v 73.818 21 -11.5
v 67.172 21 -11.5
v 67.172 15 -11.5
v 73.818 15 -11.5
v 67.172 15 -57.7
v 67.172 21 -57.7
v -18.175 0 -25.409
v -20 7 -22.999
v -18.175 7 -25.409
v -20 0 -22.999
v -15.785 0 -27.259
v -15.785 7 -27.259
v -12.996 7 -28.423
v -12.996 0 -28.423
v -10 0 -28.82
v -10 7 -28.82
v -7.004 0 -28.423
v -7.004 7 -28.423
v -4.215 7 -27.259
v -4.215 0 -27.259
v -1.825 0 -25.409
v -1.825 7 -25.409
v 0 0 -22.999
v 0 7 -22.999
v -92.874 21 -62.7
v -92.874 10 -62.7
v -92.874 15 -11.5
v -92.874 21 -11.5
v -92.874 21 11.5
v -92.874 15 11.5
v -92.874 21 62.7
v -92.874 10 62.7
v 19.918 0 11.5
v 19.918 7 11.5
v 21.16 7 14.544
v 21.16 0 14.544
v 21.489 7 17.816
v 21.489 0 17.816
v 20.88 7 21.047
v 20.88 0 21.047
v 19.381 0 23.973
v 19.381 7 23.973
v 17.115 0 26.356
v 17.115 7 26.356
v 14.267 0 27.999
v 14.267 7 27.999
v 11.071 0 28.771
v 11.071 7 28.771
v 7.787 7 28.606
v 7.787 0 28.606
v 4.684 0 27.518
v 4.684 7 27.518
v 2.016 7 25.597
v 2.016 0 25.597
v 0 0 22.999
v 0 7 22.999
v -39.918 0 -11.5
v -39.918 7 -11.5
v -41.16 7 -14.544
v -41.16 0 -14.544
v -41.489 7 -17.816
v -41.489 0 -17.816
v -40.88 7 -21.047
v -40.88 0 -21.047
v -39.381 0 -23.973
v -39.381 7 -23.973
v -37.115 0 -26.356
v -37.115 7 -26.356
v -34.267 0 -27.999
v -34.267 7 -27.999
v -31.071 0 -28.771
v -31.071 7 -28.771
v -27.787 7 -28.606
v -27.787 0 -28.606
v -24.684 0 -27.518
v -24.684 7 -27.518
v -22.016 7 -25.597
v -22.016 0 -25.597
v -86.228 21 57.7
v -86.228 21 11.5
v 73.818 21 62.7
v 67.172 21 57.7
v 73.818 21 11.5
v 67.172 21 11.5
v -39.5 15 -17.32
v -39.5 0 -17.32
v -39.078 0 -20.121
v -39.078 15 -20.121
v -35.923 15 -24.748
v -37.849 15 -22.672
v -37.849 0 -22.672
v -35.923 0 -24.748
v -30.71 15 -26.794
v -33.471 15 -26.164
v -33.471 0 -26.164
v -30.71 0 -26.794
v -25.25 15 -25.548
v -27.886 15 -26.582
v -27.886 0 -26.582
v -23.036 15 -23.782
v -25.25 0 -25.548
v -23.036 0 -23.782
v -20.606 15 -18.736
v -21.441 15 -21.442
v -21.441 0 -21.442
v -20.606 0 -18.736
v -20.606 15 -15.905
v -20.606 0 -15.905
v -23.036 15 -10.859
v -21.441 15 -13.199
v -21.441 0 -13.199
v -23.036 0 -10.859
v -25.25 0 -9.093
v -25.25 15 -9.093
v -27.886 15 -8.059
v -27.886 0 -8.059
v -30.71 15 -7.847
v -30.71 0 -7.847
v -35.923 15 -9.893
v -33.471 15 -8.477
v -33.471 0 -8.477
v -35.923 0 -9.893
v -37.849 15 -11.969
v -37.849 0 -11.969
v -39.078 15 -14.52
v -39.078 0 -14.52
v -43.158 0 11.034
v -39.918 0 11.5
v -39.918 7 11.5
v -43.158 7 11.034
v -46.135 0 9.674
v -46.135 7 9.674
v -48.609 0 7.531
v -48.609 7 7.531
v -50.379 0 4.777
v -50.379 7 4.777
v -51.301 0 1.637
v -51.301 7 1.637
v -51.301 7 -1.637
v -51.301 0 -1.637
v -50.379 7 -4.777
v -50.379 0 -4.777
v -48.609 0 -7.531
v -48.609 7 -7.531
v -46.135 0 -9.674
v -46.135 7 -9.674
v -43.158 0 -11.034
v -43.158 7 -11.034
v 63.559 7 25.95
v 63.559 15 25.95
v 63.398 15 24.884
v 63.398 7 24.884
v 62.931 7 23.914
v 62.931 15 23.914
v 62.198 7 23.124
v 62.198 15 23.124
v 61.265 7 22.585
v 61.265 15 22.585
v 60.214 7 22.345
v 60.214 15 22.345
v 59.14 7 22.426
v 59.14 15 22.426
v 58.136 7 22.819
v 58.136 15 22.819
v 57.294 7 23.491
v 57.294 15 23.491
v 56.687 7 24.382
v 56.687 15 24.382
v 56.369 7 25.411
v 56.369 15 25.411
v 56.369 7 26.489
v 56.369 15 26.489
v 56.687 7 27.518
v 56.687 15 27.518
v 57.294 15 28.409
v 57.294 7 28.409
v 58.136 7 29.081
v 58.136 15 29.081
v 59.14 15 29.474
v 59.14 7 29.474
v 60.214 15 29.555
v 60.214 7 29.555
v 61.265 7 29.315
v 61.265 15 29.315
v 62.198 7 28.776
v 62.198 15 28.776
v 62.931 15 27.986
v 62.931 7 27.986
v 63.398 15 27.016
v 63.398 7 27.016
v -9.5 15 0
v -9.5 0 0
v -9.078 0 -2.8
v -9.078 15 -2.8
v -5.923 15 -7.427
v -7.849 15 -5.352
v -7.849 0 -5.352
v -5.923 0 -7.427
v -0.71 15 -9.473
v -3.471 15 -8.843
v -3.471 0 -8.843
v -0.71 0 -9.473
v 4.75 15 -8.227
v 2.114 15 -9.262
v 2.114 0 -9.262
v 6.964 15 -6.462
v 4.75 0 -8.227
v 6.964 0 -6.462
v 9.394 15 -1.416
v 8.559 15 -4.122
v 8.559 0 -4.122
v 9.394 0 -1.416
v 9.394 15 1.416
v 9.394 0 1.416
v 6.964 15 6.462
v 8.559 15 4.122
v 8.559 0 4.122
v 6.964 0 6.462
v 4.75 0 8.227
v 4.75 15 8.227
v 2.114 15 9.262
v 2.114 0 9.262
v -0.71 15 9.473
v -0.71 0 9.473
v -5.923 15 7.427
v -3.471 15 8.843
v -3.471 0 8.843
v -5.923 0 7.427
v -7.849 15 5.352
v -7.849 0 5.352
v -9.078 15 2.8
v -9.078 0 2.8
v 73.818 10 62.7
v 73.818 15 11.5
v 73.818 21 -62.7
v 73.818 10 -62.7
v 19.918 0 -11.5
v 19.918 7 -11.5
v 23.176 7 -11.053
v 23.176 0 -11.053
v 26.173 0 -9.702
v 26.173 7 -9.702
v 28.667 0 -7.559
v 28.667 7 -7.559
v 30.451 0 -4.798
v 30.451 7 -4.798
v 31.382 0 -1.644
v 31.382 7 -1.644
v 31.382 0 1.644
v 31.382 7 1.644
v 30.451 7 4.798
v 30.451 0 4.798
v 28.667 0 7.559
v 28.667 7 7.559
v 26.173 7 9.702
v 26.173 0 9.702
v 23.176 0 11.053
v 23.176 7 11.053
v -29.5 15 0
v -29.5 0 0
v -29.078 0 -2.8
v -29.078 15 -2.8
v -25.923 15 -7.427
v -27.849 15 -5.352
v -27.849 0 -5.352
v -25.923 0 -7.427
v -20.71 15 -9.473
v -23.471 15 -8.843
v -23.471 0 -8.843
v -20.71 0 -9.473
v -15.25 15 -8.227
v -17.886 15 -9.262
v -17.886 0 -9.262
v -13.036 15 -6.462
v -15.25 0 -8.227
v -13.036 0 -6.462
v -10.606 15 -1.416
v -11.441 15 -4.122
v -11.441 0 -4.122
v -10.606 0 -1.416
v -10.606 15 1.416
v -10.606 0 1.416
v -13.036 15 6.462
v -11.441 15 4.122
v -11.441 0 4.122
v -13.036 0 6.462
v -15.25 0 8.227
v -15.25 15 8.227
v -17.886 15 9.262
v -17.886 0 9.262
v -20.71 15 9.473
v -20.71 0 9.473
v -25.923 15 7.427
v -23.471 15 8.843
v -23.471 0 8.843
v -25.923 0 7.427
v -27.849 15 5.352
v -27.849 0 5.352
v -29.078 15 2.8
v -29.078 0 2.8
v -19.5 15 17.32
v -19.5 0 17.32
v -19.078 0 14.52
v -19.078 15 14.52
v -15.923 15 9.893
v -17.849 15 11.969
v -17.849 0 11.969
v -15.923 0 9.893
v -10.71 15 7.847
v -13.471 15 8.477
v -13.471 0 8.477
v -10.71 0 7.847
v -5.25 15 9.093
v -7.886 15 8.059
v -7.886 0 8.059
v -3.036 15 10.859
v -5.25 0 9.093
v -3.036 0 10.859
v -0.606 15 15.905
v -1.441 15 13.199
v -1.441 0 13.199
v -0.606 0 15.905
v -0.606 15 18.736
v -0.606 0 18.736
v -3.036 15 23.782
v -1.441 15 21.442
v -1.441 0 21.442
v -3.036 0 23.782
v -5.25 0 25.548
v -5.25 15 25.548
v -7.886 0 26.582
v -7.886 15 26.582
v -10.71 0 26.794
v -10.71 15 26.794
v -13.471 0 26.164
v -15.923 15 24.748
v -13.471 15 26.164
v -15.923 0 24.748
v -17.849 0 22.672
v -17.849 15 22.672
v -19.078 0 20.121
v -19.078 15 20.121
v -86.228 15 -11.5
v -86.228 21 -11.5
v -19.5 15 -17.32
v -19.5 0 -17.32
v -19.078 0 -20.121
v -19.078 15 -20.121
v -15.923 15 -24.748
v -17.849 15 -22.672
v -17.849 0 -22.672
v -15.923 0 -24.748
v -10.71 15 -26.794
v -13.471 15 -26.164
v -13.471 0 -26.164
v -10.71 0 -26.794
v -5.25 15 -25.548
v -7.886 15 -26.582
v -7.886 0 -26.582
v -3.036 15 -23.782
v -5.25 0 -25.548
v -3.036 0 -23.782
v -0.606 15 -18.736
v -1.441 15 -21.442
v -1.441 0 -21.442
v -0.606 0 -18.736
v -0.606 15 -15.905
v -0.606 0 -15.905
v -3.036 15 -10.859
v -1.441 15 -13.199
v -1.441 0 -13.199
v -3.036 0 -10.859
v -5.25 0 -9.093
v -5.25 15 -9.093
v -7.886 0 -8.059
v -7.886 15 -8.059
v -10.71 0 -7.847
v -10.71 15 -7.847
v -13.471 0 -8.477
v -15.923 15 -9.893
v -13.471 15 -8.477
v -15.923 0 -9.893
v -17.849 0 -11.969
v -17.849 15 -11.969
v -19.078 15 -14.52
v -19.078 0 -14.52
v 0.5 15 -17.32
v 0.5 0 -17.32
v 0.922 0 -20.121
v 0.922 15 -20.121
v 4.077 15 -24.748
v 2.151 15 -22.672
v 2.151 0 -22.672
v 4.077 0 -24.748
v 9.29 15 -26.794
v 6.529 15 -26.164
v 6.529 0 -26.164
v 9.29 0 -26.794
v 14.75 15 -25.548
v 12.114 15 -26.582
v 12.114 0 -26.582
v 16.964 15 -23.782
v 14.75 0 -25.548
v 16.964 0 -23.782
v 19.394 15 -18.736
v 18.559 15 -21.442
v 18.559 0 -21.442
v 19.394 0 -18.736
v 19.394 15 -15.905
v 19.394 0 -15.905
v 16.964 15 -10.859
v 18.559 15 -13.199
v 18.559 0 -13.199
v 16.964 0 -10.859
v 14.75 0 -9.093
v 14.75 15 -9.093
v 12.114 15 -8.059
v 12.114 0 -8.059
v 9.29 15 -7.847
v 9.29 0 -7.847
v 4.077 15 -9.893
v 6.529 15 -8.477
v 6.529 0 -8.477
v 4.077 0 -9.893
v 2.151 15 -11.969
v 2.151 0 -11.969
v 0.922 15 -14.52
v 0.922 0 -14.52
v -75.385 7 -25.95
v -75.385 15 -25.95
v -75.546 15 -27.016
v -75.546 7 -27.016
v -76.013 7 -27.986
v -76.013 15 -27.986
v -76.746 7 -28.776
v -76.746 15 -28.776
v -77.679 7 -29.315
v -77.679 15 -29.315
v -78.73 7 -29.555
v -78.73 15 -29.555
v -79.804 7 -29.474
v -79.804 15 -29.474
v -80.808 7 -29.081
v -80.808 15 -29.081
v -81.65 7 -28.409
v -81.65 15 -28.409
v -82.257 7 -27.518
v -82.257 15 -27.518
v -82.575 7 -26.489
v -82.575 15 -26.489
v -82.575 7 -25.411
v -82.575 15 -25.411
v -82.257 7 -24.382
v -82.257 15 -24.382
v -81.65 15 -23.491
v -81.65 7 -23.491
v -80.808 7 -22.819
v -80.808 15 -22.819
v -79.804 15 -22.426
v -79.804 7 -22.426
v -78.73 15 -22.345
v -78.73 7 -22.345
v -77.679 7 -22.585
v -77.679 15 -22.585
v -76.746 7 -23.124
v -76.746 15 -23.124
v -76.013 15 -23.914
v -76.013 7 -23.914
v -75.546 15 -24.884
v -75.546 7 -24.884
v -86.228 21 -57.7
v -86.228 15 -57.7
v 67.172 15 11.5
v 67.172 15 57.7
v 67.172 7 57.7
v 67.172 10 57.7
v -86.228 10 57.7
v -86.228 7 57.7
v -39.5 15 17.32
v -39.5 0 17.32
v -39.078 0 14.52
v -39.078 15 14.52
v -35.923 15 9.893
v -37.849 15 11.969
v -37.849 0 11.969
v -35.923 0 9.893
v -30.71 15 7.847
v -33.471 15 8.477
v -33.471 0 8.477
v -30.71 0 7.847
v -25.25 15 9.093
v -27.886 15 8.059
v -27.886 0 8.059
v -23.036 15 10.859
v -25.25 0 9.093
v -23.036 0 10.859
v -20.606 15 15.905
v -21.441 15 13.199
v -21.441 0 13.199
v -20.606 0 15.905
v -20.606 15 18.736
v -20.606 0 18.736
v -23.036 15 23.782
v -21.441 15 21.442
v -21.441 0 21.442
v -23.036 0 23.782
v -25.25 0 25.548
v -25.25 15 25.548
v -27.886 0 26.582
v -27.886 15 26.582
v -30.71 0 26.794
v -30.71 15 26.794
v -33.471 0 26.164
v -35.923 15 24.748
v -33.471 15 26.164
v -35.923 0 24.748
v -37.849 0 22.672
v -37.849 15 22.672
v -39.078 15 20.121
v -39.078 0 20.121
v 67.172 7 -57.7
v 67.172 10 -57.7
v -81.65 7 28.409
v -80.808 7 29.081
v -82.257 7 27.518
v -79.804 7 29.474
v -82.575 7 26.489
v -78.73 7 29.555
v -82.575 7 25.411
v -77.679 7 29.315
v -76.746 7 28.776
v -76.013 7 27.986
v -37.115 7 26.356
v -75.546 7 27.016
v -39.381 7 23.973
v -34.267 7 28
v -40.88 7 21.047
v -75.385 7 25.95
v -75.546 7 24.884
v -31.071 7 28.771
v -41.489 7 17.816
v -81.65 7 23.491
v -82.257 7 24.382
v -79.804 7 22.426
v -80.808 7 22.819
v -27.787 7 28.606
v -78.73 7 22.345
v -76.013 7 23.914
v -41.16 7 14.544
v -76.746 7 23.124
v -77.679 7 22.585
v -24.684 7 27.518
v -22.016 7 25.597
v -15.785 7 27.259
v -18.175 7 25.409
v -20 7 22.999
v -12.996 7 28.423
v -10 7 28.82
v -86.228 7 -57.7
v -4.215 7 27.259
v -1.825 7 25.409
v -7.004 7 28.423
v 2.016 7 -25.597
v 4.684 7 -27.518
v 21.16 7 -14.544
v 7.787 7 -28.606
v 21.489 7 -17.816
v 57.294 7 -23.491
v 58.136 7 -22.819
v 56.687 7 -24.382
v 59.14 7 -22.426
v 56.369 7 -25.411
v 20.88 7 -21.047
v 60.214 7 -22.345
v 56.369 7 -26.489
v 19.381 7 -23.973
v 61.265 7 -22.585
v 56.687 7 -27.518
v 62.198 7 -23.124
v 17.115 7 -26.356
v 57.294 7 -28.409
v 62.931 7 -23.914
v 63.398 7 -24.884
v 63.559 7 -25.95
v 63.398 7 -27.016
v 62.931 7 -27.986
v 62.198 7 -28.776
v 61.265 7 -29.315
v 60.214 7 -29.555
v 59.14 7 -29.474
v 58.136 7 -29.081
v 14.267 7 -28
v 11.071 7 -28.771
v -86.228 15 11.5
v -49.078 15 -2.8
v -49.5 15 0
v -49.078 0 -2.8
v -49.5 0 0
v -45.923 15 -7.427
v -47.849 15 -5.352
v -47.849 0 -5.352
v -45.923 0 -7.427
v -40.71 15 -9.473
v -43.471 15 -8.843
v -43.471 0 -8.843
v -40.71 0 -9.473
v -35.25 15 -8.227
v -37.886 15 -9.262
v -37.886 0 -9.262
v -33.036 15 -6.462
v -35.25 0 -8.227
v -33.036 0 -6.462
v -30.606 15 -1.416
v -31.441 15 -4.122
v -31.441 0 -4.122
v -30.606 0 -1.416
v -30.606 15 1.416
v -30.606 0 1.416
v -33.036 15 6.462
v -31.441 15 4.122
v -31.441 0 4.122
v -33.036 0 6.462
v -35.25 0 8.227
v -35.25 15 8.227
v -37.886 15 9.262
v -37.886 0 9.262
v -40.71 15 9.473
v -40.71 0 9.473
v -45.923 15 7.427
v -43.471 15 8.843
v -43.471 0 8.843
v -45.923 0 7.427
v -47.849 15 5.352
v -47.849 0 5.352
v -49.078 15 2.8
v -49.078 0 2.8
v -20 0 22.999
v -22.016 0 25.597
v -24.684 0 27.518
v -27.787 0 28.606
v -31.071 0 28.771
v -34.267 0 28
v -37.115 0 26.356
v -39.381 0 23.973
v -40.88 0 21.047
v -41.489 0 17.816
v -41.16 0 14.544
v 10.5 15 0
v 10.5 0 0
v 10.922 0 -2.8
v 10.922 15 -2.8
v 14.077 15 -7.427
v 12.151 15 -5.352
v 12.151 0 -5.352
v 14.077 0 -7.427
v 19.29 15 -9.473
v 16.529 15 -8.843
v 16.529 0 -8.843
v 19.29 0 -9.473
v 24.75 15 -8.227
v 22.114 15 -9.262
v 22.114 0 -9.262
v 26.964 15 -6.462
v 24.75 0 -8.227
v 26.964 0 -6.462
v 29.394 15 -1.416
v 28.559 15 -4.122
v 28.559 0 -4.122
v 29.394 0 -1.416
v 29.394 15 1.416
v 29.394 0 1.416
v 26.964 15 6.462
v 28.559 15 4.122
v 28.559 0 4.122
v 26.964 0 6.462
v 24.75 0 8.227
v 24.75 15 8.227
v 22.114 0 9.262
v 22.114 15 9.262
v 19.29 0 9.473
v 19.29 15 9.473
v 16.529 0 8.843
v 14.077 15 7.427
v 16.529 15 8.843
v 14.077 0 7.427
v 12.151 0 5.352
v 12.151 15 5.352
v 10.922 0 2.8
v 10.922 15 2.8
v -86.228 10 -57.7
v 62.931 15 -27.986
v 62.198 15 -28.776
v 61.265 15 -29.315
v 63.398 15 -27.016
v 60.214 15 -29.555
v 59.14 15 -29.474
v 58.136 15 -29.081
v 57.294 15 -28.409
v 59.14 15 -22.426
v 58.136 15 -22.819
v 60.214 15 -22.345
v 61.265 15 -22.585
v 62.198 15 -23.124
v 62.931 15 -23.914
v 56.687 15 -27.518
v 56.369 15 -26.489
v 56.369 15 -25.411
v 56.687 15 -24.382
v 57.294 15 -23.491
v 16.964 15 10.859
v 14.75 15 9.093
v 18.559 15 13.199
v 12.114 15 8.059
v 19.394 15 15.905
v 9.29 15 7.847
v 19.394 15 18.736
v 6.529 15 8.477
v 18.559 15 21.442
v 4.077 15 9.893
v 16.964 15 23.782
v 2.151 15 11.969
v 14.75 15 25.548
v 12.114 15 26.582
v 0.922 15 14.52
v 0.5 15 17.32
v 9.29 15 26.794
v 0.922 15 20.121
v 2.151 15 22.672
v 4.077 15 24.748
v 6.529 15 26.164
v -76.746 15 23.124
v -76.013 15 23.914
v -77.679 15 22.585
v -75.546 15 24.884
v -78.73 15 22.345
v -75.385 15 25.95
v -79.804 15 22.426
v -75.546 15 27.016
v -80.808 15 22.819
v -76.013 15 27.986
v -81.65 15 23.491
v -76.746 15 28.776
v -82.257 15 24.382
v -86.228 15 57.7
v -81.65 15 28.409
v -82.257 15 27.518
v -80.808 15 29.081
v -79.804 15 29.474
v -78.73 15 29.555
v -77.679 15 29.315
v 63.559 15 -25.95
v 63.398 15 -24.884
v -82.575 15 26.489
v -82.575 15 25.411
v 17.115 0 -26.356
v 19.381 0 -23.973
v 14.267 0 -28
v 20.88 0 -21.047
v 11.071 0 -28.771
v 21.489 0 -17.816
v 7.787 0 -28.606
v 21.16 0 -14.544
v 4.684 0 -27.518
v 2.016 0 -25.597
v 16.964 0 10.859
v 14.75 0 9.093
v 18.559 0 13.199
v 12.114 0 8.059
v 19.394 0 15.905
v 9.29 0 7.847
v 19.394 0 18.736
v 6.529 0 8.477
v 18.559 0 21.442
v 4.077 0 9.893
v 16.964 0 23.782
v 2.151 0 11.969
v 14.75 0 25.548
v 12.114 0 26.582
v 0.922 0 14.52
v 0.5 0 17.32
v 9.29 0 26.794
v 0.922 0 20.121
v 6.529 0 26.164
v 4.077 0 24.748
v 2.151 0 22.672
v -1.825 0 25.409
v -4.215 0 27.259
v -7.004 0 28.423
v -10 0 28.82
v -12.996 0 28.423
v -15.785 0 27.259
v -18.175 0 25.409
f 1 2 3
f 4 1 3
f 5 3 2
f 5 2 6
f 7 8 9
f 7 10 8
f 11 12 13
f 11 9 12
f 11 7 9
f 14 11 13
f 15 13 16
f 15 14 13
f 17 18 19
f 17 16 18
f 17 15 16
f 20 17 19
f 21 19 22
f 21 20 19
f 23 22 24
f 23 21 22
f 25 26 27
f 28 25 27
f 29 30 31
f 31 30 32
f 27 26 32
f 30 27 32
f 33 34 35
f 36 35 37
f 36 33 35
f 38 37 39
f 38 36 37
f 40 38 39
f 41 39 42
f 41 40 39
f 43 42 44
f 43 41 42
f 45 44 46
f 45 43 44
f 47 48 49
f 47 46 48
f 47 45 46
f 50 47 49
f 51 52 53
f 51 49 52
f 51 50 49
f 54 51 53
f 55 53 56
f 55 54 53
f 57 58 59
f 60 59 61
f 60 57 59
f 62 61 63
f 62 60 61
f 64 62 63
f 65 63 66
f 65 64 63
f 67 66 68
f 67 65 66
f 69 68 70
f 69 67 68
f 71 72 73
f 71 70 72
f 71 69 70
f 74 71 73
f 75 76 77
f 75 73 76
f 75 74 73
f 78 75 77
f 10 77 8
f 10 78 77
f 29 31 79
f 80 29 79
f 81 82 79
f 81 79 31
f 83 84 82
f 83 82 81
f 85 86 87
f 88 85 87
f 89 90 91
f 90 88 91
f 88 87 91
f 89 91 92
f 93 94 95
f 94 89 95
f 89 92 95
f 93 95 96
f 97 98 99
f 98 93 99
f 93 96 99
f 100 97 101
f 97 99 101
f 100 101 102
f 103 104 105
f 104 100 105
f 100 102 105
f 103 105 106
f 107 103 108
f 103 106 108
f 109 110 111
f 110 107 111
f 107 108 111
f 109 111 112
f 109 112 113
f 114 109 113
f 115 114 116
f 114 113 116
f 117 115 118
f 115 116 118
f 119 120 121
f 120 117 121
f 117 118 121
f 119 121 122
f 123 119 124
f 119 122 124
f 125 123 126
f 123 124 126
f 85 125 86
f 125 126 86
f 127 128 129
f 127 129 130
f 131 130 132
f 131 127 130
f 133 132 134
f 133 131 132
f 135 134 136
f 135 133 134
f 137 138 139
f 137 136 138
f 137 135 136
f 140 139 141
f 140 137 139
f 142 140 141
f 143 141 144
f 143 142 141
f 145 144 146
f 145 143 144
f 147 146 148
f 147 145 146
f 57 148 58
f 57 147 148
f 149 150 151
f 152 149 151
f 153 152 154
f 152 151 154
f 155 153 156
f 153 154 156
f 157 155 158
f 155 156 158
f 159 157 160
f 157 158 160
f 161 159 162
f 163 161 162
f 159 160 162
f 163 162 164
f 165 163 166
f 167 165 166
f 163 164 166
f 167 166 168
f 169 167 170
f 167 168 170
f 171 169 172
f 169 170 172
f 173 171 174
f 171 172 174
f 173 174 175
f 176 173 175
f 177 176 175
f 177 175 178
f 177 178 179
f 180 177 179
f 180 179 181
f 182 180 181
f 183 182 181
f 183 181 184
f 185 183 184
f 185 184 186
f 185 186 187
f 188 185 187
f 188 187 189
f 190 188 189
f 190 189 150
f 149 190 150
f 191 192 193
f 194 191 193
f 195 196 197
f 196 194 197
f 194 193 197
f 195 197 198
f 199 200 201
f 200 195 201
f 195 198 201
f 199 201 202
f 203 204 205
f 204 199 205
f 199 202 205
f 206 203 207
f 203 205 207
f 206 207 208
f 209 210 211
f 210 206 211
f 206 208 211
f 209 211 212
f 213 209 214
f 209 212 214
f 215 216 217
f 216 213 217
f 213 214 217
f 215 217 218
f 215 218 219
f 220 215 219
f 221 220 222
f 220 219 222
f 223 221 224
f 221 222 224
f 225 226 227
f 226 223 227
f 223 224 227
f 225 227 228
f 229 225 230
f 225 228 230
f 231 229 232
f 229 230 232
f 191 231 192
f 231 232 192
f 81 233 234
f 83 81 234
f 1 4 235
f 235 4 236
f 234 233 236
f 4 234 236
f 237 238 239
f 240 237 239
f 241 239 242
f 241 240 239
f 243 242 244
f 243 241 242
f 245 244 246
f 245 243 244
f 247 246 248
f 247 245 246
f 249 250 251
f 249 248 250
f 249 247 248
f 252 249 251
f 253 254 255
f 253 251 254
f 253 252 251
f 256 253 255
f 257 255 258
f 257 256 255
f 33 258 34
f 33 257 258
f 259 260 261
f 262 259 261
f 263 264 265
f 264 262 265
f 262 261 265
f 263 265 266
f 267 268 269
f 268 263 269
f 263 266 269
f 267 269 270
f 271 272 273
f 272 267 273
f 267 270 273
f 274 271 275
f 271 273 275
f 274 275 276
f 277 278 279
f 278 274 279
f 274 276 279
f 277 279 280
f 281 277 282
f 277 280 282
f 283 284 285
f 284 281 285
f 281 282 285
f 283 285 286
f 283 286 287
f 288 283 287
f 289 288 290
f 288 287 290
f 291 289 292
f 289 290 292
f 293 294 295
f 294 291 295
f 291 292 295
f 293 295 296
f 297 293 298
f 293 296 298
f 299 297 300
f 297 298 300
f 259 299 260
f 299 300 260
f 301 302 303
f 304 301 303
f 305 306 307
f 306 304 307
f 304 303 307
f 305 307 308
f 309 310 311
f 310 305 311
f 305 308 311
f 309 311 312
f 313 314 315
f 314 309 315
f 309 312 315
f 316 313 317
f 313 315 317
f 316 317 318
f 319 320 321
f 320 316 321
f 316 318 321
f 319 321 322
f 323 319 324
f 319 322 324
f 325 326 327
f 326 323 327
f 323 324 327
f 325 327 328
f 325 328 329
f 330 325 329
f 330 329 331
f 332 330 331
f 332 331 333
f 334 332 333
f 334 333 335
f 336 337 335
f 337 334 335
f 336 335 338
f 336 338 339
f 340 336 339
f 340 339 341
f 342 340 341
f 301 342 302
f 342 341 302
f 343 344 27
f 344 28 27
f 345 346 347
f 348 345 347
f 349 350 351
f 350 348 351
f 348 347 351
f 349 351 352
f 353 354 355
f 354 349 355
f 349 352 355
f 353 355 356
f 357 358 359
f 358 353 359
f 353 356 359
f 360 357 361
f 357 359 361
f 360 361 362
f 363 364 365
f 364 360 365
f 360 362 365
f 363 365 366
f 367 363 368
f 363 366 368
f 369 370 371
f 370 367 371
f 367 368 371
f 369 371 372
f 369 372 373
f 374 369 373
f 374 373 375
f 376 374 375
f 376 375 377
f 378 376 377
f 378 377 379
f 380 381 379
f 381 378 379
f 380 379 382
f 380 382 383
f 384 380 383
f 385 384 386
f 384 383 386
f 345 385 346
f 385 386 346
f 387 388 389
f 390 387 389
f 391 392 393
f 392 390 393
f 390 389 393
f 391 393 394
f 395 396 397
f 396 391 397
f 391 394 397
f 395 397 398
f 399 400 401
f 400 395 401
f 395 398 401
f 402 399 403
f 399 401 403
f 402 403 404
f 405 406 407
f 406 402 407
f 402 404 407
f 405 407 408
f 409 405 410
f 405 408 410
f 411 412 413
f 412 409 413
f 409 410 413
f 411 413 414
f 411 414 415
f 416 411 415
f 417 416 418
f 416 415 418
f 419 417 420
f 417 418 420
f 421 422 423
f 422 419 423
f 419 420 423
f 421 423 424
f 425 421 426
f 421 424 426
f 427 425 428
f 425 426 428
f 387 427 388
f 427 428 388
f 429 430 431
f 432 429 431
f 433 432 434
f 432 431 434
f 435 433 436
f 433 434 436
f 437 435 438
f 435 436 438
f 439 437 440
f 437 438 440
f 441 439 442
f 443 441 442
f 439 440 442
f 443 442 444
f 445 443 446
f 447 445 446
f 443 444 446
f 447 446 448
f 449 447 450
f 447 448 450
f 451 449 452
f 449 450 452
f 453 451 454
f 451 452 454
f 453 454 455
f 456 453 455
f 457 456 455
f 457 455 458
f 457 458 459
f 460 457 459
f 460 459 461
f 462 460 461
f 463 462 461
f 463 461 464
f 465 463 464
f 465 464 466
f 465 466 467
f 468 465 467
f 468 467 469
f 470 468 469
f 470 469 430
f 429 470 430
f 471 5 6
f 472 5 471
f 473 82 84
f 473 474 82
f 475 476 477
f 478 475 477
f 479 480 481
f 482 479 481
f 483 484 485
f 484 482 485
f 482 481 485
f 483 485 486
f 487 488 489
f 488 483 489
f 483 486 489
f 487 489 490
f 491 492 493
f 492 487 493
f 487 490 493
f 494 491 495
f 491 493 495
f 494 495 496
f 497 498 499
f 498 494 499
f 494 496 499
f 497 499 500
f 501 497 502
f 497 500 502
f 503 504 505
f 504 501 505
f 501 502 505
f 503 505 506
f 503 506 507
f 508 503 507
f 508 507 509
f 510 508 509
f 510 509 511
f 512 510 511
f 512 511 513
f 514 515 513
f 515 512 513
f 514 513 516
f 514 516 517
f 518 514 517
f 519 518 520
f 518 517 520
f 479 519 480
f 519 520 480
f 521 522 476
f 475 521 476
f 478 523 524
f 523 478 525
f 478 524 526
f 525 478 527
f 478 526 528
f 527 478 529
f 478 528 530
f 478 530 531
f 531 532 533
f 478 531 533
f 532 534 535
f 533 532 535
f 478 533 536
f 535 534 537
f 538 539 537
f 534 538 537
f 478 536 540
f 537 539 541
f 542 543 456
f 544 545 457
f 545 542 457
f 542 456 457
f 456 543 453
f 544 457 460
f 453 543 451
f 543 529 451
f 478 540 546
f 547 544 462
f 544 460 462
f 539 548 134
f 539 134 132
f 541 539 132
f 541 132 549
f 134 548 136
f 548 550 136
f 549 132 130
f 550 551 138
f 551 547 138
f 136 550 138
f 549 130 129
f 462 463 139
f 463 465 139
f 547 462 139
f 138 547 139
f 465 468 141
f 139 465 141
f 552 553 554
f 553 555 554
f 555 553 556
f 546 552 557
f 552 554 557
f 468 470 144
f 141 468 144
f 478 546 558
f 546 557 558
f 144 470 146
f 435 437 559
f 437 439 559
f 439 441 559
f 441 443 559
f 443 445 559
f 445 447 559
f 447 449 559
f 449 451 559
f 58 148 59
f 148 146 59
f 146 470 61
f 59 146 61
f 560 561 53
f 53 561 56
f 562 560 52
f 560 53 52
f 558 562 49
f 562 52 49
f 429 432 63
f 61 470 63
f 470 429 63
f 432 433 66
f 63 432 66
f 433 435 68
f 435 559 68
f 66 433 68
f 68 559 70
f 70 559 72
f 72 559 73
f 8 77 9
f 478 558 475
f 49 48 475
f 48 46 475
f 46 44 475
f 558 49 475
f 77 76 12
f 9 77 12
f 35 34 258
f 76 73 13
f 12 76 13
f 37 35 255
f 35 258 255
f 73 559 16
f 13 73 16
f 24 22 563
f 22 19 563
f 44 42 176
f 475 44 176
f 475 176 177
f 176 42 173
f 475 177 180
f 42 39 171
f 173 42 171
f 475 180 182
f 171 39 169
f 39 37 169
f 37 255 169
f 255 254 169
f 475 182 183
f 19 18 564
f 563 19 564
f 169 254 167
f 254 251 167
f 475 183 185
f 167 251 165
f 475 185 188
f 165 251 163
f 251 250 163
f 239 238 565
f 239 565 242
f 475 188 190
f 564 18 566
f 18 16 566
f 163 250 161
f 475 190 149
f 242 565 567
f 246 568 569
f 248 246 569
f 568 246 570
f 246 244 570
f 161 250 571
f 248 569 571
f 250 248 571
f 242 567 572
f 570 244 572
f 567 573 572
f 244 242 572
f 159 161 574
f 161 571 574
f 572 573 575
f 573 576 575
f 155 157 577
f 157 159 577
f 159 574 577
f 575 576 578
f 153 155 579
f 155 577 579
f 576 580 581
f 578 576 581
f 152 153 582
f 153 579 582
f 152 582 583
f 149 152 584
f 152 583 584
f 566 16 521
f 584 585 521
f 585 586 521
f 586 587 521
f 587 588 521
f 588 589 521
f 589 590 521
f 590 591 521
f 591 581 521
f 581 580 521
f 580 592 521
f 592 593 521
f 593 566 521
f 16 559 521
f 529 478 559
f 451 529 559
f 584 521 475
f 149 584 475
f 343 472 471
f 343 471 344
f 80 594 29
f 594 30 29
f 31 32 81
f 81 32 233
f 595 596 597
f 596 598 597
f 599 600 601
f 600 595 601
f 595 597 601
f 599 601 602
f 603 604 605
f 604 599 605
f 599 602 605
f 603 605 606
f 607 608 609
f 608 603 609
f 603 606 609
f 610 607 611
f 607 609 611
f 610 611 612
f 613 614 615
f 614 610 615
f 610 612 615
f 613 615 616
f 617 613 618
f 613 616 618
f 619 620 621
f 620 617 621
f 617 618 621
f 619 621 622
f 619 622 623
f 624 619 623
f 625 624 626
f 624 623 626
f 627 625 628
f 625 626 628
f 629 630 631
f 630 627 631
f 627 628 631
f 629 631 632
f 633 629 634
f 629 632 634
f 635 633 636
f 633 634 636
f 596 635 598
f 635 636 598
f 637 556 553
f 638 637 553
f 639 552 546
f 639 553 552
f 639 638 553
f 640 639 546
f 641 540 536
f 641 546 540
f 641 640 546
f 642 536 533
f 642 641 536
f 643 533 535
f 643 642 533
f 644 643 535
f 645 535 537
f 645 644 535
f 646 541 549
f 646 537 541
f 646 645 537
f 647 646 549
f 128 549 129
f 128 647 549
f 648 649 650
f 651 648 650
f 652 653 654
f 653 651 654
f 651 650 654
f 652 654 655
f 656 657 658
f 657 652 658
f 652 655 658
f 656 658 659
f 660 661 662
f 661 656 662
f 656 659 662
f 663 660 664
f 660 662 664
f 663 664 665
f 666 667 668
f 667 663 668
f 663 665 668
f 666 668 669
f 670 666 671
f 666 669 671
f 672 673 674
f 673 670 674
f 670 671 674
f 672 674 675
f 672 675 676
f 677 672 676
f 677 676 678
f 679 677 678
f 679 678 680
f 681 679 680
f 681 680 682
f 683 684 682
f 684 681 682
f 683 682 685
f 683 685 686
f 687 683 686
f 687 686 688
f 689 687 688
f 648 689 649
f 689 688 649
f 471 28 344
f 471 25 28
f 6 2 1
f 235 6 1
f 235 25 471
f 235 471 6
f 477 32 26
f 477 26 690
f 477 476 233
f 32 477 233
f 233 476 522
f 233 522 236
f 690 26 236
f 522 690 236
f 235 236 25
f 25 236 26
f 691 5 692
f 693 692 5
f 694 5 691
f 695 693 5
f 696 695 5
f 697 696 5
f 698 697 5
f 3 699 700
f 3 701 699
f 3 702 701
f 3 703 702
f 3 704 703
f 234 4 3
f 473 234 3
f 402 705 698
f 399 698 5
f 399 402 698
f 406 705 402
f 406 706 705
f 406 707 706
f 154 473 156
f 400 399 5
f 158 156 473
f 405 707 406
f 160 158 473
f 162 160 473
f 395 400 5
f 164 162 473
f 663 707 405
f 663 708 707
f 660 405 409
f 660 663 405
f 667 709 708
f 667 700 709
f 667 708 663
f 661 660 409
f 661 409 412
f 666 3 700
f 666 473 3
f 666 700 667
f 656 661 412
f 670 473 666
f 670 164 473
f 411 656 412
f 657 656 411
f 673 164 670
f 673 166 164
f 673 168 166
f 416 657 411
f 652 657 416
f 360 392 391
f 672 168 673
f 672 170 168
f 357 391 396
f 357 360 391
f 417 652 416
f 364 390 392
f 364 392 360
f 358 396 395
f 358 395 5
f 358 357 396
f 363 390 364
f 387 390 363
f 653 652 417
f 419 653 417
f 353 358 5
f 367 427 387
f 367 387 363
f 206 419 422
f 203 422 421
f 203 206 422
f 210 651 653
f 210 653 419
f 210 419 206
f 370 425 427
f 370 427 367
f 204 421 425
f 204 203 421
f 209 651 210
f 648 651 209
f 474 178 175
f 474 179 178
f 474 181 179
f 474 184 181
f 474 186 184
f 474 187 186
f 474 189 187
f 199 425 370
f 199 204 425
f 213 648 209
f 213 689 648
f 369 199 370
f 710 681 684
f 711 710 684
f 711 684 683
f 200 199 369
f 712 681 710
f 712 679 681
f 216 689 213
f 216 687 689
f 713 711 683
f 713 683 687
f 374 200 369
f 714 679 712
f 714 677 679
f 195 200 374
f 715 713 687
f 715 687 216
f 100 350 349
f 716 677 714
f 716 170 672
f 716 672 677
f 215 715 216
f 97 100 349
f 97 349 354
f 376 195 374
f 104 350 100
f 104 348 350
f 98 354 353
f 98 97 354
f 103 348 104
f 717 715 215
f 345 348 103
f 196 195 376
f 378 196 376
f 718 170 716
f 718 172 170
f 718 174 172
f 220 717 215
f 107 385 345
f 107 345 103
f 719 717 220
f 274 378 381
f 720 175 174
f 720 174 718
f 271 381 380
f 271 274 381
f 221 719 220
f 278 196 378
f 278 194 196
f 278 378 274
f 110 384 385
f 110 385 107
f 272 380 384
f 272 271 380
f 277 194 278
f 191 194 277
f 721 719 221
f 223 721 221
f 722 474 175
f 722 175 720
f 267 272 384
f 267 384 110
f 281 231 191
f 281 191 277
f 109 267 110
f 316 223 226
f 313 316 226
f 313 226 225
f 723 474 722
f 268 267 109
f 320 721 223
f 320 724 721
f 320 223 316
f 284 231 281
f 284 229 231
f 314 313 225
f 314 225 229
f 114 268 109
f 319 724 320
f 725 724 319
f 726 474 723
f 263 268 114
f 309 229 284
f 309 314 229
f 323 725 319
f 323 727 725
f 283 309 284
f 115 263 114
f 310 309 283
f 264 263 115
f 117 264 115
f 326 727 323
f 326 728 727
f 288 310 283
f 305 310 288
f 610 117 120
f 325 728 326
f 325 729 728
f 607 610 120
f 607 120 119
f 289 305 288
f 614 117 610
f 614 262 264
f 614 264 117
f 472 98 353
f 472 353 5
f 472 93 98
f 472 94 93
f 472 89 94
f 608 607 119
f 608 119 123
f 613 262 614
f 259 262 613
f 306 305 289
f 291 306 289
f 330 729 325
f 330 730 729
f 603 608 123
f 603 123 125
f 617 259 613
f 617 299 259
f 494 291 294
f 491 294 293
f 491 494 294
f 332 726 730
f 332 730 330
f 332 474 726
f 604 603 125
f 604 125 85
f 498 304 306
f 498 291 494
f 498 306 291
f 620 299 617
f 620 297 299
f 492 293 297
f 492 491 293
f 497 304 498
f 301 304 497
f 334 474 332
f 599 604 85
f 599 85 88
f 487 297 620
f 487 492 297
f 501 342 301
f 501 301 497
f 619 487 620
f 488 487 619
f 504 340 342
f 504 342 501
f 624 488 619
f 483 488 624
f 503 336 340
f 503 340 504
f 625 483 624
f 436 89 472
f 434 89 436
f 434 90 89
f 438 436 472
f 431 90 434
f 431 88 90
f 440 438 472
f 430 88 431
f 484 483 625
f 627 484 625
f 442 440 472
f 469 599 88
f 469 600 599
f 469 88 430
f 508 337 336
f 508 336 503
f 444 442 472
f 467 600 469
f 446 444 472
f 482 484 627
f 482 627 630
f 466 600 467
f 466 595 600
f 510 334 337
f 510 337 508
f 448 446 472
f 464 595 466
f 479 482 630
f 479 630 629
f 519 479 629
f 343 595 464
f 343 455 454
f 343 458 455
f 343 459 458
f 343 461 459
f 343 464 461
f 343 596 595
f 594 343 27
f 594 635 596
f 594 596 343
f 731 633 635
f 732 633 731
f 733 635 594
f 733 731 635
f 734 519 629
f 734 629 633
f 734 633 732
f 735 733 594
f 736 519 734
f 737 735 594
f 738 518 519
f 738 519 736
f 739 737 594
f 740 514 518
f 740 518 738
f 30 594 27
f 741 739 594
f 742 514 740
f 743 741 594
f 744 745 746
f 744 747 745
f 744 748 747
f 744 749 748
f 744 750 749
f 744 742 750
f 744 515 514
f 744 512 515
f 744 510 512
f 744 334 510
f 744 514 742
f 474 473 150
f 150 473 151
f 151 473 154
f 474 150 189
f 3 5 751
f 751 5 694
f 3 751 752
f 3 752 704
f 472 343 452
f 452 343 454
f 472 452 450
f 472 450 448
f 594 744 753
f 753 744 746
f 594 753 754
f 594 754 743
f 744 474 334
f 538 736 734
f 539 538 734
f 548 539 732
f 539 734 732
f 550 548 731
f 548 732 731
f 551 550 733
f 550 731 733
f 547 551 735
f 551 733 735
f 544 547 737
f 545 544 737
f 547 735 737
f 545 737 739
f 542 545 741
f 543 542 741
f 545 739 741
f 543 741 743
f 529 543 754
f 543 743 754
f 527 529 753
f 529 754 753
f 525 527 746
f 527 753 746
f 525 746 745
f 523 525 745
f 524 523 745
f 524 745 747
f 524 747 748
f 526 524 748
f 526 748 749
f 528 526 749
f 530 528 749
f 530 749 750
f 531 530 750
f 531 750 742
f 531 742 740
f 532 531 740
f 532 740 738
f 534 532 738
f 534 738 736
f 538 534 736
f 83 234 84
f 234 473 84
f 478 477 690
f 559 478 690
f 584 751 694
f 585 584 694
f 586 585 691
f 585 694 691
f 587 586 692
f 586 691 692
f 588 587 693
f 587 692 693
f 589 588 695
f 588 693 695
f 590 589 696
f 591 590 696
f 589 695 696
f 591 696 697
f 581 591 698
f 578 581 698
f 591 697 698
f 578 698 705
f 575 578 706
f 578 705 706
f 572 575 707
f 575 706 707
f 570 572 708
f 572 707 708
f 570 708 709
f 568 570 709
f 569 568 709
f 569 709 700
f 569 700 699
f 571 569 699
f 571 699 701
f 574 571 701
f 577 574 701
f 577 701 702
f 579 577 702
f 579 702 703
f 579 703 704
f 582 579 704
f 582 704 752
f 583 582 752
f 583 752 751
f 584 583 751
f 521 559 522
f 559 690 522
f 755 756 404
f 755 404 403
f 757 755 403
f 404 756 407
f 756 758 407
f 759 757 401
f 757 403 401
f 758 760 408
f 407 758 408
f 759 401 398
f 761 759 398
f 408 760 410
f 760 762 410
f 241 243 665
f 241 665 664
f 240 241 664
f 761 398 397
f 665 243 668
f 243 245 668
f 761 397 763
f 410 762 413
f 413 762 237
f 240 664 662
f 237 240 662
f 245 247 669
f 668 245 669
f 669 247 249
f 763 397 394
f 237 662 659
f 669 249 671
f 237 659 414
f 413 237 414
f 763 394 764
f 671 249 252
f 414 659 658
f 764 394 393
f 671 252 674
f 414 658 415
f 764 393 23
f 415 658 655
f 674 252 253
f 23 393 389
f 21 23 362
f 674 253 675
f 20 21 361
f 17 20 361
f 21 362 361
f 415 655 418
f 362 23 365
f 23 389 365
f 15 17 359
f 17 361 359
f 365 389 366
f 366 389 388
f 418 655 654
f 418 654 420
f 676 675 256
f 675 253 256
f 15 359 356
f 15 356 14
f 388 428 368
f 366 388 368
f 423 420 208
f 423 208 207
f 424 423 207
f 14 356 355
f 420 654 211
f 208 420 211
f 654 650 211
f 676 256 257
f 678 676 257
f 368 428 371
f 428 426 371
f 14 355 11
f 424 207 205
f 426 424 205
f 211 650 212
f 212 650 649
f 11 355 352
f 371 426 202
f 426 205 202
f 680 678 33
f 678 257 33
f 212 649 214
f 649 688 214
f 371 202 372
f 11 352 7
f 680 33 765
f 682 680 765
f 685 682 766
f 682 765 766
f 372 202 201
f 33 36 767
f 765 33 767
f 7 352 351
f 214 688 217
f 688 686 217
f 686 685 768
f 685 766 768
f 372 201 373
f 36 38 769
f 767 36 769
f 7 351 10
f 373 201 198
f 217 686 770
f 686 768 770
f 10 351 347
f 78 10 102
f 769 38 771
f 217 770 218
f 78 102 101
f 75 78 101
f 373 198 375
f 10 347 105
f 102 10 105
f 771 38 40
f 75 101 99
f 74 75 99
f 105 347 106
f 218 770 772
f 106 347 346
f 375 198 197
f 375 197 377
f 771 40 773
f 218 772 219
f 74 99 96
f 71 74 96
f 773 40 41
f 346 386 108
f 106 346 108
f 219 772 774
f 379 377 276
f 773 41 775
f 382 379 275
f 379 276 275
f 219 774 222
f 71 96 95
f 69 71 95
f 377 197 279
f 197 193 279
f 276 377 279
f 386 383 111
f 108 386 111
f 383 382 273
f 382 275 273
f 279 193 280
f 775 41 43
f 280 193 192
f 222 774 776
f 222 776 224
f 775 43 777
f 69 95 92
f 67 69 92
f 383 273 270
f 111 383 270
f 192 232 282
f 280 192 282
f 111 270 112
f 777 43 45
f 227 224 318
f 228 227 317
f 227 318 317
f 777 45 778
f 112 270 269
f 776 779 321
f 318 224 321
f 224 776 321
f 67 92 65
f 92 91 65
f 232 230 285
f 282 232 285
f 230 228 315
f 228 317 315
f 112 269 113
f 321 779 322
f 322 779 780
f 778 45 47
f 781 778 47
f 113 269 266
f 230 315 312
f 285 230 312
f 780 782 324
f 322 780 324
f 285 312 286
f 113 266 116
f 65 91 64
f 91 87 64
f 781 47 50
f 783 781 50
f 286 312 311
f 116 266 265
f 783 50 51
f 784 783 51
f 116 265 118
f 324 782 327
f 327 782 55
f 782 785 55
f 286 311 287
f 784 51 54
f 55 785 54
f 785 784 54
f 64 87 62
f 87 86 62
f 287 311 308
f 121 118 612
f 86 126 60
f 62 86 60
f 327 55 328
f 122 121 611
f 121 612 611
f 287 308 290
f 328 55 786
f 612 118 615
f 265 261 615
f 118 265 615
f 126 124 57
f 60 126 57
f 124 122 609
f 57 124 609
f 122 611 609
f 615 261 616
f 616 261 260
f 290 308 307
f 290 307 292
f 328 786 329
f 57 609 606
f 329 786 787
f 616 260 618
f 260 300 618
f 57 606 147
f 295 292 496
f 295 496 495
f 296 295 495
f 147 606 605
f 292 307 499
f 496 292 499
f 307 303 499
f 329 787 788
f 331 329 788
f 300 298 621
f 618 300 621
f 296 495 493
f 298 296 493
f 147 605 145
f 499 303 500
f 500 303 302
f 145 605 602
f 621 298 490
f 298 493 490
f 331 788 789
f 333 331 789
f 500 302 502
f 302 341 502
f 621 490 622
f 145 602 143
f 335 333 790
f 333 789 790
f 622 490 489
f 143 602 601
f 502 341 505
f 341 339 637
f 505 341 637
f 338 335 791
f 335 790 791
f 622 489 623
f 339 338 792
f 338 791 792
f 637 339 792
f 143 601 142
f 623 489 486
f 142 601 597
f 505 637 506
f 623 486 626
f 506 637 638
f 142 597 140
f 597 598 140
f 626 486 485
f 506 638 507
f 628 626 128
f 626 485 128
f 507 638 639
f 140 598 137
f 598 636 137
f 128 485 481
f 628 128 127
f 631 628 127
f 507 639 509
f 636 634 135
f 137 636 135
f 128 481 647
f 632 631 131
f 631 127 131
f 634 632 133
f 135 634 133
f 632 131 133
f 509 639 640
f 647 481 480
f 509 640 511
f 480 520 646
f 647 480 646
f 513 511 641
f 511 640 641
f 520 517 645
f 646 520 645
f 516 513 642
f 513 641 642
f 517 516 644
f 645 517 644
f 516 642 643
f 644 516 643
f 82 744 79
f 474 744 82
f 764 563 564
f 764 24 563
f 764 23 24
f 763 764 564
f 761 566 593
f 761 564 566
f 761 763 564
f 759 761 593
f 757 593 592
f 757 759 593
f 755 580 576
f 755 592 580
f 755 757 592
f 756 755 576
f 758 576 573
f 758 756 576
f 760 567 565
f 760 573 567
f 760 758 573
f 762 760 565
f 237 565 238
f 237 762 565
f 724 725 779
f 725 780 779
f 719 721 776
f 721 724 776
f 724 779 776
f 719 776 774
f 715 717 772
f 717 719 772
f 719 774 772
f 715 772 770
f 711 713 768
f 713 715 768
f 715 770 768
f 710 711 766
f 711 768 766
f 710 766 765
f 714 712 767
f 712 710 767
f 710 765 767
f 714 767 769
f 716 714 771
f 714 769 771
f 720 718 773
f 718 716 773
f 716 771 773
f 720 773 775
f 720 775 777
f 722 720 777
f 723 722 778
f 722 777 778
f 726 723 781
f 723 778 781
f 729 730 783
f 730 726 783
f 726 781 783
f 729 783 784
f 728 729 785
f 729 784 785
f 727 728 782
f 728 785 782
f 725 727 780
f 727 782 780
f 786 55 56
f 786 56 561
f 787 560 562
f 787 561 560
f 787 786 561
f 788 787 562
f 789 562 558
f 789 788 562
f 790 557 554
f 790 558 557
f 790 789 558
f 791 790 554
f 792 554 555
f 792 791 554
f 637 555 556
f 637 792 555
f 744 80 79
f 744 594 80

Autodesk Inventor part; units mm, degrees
ref_plane "YZ Plane" through (0, 0, 0) normal (1, 0, 0) x (0, 1, 0)
ref_plane "XZ Plane" through (0, 0, 0) normal (0, 1, 0) x (-1, 0, 0)
ref_plane "XY Plane" through (0, 0, 0) normal (0, 0, 1) x (1, 0, 0)
sketch "Sketch1" plane through (0, 0, 0) normal (0, 1, 0) x (-1, 0, 0)
  circle A0 centre (0, 0) radius 9.5
  circle A1 centre (20, 0) radius 9.5
  circle A2 centre (-20, 0) radius 9.5
  circle A3 centre (-10, 17.3205) radius 9.5
  circle A4 centre (10, 17.3205) radius 9.5
  circle A5 centre (30, 17.3205) radius 9.5
  circle A6 centre (10, -17.3205) radius 9.5
  circle A7 centre (30, -17.3205) radius 9.5
  circle A8 centre (-10, -17.3205) radius 9.5
  circle A9 centre (40, 0) radius 9.5
  line L0 (0, 0) -> (-32.9562, 0) construction
  line L1 (-32.9562, 0) -> (61.076, 0) construction
  circle A10 centre (0, 0) radius 10.5 construction
  circle A11 centre (-20, 0) radius 10.5 construction
  circle A12 centre (-10, -17.3205) radius 10.5 construction
  circle A13 centre (10, -17.3205) radius 10.5 construction
  circle A14 centre (30, -17.3205) radius 10.5 construction
  circle A15 centre (40, 0) radius 10.5 construction
  circle A16 centre (20, 0) radius 10.5 construction
  circle A17 centre (30, 17.3205) radius 10.5 construction
  circle A18 centre (10, 17.3205) radius 10.5 construction
  circle A19 centre (-10, 17.3205) radius 10.5 construction
  circle A20 centre (40, 0) radius 11.5 construction
  circle A21 centre (30, -17.3205) radius 11.5 construction
  circle A22 centre (10, -17.3205) radius 11.5 construction
  circle A23 centre (-10, -17.3205) radius 11.5 construction
  circle A24 centre (-20, 0) radius 11.5 construction
  circle A25 centre (-10, 17.3205) radius 11.5 construction
  circle A26 centre (10, 17.3205) radius 11.5 construction
  circle A27 centre (30, 17.3205) radius 11.5 construction
  circle A28 centre (0, 0) radius 11.5 construction
  circle A29 centre (20, 0) radius 11.5 construction
  arc A30 (39.9181, -11.4997) -> (39.9181, 11.4997) centre (39.9181, 0) ccw
  arc A31 (39.9181, 11.4997) -> (20, 22.9994) centre (30, 17.3205) ccw
  arc A32 (20, 22.9994) -> (0, 22.9994) centre (10, 17.3205) ccw
  arc A33 (0, 22.9994) -> (-19.9181, 11.4997) centre (-10, 17.3205) ccw
  arc A34 (-19.9181, 11.4997) -> (-19.9181, -11.4997) centre (-20, 0) ccw
  arc A35 (-19.9181, -11.4997) -> (0, -22.9994) centre (-10, -17.3205) ccw
  arc A36 (0, -22.9994) -> (20, -22.9994) centre (10, -17.3205) ccw
  arc A37 (20, -22.9994) -> (39.9181, -11.4997) centre (30, -17.3205) ccw
  point P0 (28.893, 7.4235)
  dimension "d0" = 19
  dimension "d2" = 19
  dimension "d4" = 19
  dimension "d6" = 19
  dimension "d8" = 19
  dimension "d10" = 19
  dimension "d11" = 19
  dimension "d13" = 19
  dimension "d14" = 19
  dimension "d53" = 19
  dimension "d91" = 1
  dimension "d144" = 21
  dimension "d145" = 21
  dimension "d146" = 21
  dimension "d147" = 21
  dimension "d148" = 21
  dimension "d149" = 21
  dimension "d150" = 21
  dimension "d151" = 21
  dimension "d152" = 21
  dimension "d153" = 21
  dimension "d154" = 23
  dimension "d155" = 23
  dimension "d156" = 23
  dimension "d157" = 23
  dimension "d158" = 23
  dimension "d159" = 23
  dimension "d160" = 23
  dimension "d161" = 23
  dimension "d162" = 23
  dimension "d163" = 23
extrude "Extrusion1" add sketch "Sketch1" along normal blind 15
sketch "Sketch4" plane through (0, 15, 0) normal (0, 1, 0) x (1, 0, 0)
  circle A0 centre (-30, 17.3205) radius 9.5 projected
  circle A1 centre (-40, 0) radius 9.5 projected
  circle A2 centre (-40, 0) radius 9.5 projected
  circle A3 centre (10, 17.3205) radius 9.5 projected
  circle A4 centre (-30, 17.3205) radius 9.5 projected
  circle A5 centre (-10, 17.3205) radius 9.5 projected
  circle A6 centre (-30, -17.3205) radius 9.5 projected
  circle A7 centre (-10, -17.3205) radius 9.5 projected
  circle A8 centre (10, -17.3205) radius 9.5 projected
  circle A9 centre (20, 0) radius 9.5 projected
  circle A10 centre (-20, 0) radius 9.5 projected
  circle A11 centre (0, 0) radius 9.5 projected
  line L0 (0, 0) -> (-9.528, 0) construction
  line L1 (-86.228, 57.7) -> (67.172, 57.7)
  line L2 (67.172, 57.7) -> (67.172, -57.7)
  line L3 (67.172, -57.7) -> (-86.228, -57.7)
  line L4 (-86.228, -57.7) -> (-86.228, 57.7)
  line L5 (-86.228, 57.7) -> (67.172, -57.7) construction
  line L6 (67.172, 57.7) -> (-86.228, -57.7) construction
  arc A12 (0, 22.9994) -> (-20, 22.9994) centre (-10, 17.3205) ccw projected
  arc A13 (19.9181, 11.4997) -> (0, 22.9994) centre (10, 17.3205) ccw projected
  arc A14 (19.9181, -11.4997) -> (19.9181, 11.4997) centre (20, 0) ccw projected
  arc A15 (0, -22.9994) -> (19.9181, -11.4997) centre (10, -17.3205) ccw projected
  arc A16 (-20, -22.9994) -> (0, -22.9994) centre (-10, -17.3205) ccw projected
  arc A17 (-39.9181, -11.4997) -> (-20, -22.9994) centre (-30, -17.3205) ccw projected
  circle A18 centre (-30, 17.3205) radius 11.5 construction
  arc A19 (-39.9181, 11.4997) -> (-39.9181, -11.4997) centre (-39.9181, 0) ccw projected
  arc A20 (-20, 22.9994) -> (-39.9181, 11.4997) centre (-30, 17.3205) ccw projected
  arc A21 (0, 22.9994) -> (-20, 22.9994) centre (-10, 17.3205) ccw
  arc A22 (19.9181, 11.4997) -> (0, 22.9994) centre (10, 17.3205) ccw
  arc A23 (19.9181, -11.4997) -> (19.9181, 11.4997) centre (20, 0) ccw
  arc A24 (0, -22.9994) -> (19.9181, -11.4997) centre (10, -17.3205) ccw
  arc A25 (-20, -22.9994) -> (0, -22.9994) centre (-10, -17.3205) ccw
  arc A26 (-39.9181, -11.4997) -> (-20, -22.9994) centre (-30, -17.3205) ccw
  arc A27 (-39.9181, 11.4997) -> (-39.9181, -11.4997) centre (-39.9181, 0) ccw
  arc A28 (-20, 22.9994) -> (-39.9181, 11.4997) centre (-30, 17.3205) ccw
  point P0 (-17.0502, -21.4927)
  point P1 (-17.0502, -11.5134)
  point P2 (-17.0502, -8.8009)
  point P3 (-17.0502, 8.8009)
  point P4 (-17.0502, 11.5134)
  point P5 (-17.0502, 21.4927)
  point P6 (-2.0059, 21.4927)
  point P7 (-2.0059, -11.5134)
  point P8 (-2.0059, -8.8009)
  point P9 (-2.0059, 8.8009)
  point P10 (-2.0059, 11.5134)
  point P11 (-2.0059, -21.4927)
  dimension "d104" = 153.4
  dimension "d164" = 115.4
extrude "Extrusion7" add sketch "Sketch4" against normal blind 8 contours L1 L2 L3 L4
sketch "Sketch5" plane through (0, 15, 0) normal (0, 1, 0) x (1, 0, 0)
  line L0 (-86.228, -57.7) -> (67.172, -57.7) projected
  line L1 (67.172, -57.7) -> (67.172, 57.7) projected
  line L2 (67.172, 57.7) -> (-86.228, 57.7) projected
  line L3 (-86.228, 57.7) -> (-86.228, -57.7) projected
  circle A0 centre (-40, 0) radius 9.5 projected
  circle A1 centre (10, 17.3205) radius 9.5 projected
  circle A2 centre (-30, 17.3205) radius 9.5 projected
  circle A3 centre (-10, 17.3205) radius 9.5 projected
  circle A4 centre (-30, -17.3205) radius 9.5 projected
  circle A5 centre (-10, -17.3205) radius 9.5 projected
  circle A6 centre (10, -17.3205) radius 9.5 projected
  circle A7 centre (20, 0) radius 9.5 projected
  circle A8 centre (-20, 0) radius 9.5 projected
  circle A9 centre (0, 0) radius 9.5 projected
  line L4 (-86.228, 57.7) -> (67.172, 57.7)
  line L5 (67.172, 57.7) -> (67.172, -57.7)
  line L6 (67.172, -57.7) -> (-86.228, -57.7)
  line L7 (-86.228, -57.7) -> (-86.228, 57.7)
  line L8 (-92.8745, -62.7) -> (73.8184, -62.7)
  line L9 (73.8184, -62.7) -> (73.8184, 62.7)
  line L10 (73.8184, 62.7) -> (-92.8745, 62.7)
  line L11 (-92.8745, 62.7) -> (-92.8745, -62.7)
  line L12 (-92.8745, -62.7) -> (73.8184, 62.7) construction
  line L13 (73.8184, -62.7) -> (-92.8745, 62.7) construction
  point P0 (66.922, -57.45)
  point P1 (-9.528, 0)
  dimension "d169" = 5
  dimension "d170" = 6.6464
  dimension "d171" = 166.6929
  dimension "d172" = 125.4
extrude "Extrusion8" add sketch "Sketch5" along normal blind 6 and the other way blind 5 contours L11 L10 L9 L8
sketch "Sketch6" plane through (0, 15, 0) normal (0, 1, 0) x (1, 0, 0)
  line L0 (59.944, 57.1514) -> (59.944, 25.95) construction
  line L1 (59.944, 25.95) -> (67.172, 25.95) construction
  line L2 (-79, -57.7) -> (-79, -25.95) construction
  line L3 (-79, -25.95) -> (-86.228, -25.95) construction
  circle A0 centre (59.944, 25.95) radius 3.615
  circle A1 centre (59.944, -25.95) radius 3.615
  circle A2 centre (-79, -25.95) radius 3.615
  circle A3 centre (-79, 25.95) radius 3.615
  line L4 (73.8184, -62.7) -> (73.8184, 62.7) projected
  line L5 (73.8184, 62.7) -> (-92.8745, 62.7) projected
  line L6 (-92.8745, 62.7) -> (-92.8745, -62.7) projected
  line L7 (-92.8745, -62.7) -> (73.8184, -62.7) projected
  line L8 (-86.228, -57.7) -> (-86.228, 57.7) projected
  line L9 (-86.228, 57.7) -> (67.172, 57.7) projected
  line L10 (67.172, 57.7) -> (67.172, -57.7) projected
  line L11 (67.172, -57.7) -> (-86.228, -57.7) projected
  line L12 (-86.228, -57.7) -> (67.172, -57.7) projected
  line L13 (67.172, -57.7) -> (67.172, 57.7) projected
  line L14 (67.172, 57.7) -> (-86.228, 57.7) projected
  line L15 (-86.228, 57.7) -> (-86.228, -57.7) projected
  circle A4 centre (-40, 0) radius 9.5 projected
  circle A5 centre (10, 17.3205) radius 9.5 projected
  circle A6 centre (-30, 17.3205) radius 9.5 projected
  circle A7 centre (-10, 17.3205) radius 9.5 projected
  circle A8 centre (-30, -17.3205) radius 9.5 projected
  circle A9 centre (-10, -17.3205) radius 9.5 projected
  circle A10 centre (10, -17.3205) radius 9.5 projected
  circle A11 centre (20, 0) radius 9.5 projected
  circle A12 centre (-20, 0) radius 9.5 projected
  circle A13 centre (0, 0) radius 9.5 projected
  line L16 (-86.228, 57.7) -> (67.172, 57.7)
  line L17 (67.172, 57.7) -> (67.172, -57.7)
  line L18 (67.172, -57.7) -> (-86.228, -57.7)
  line L19 (-86.228, -57.7) -> (-86.228, 57.7)
  dimension "d123" = 7.23
  dimension "d124" = 7.23
  dimension "d125" = 7.23
  dimension "d140" = 7.23
  dimension "d179" = 31.75
  dimension "d180" = 7.228
  dimension "d181" = 7.228
  dimension "d182" = 31.75
  dimension "d183" = 31.75
  dimension "d184" = 7.228
  dimension "d185" = 7.228
  dimension "d186" = 31.75
extrude "Extrusion6" cut sketch "Sketch6" against normal through all contours A0 | A1 | A2 | A3
sketch "Sketch7" plane through (-92.8745, 10, 62.7) normal (-1, 0, 0) x (0, 0, 1)
  line L0 (-74.1997, -10) -> (-74.1997, -3) projected
  line L1 (-51.2003, -10) -> (-51.2003, -3) projected
  line L2 (-120.4, 5) -> (-5, 5) projected
  line L3 (0, 0) -> (-125.4, 0) projected
  line L4 (-125.4, 11) -> (0, 11) projected
  line L5 (-74.1997, 5) -> (-51.2003, 5)
  line L6 (-51.2003, 5) -> (-51.2003, 11)
  line L7 (-51.2003, 11) -> (-74.1997, 11)
  line L8 (-74.1997, 11) -> (-74.1997, 5)
  point P0 (-62.7, -10)
extrude "Extrusion9" cut sketch "Sketch7" against normal through all
properties part number "BatteryCasev1_3DPrint"
